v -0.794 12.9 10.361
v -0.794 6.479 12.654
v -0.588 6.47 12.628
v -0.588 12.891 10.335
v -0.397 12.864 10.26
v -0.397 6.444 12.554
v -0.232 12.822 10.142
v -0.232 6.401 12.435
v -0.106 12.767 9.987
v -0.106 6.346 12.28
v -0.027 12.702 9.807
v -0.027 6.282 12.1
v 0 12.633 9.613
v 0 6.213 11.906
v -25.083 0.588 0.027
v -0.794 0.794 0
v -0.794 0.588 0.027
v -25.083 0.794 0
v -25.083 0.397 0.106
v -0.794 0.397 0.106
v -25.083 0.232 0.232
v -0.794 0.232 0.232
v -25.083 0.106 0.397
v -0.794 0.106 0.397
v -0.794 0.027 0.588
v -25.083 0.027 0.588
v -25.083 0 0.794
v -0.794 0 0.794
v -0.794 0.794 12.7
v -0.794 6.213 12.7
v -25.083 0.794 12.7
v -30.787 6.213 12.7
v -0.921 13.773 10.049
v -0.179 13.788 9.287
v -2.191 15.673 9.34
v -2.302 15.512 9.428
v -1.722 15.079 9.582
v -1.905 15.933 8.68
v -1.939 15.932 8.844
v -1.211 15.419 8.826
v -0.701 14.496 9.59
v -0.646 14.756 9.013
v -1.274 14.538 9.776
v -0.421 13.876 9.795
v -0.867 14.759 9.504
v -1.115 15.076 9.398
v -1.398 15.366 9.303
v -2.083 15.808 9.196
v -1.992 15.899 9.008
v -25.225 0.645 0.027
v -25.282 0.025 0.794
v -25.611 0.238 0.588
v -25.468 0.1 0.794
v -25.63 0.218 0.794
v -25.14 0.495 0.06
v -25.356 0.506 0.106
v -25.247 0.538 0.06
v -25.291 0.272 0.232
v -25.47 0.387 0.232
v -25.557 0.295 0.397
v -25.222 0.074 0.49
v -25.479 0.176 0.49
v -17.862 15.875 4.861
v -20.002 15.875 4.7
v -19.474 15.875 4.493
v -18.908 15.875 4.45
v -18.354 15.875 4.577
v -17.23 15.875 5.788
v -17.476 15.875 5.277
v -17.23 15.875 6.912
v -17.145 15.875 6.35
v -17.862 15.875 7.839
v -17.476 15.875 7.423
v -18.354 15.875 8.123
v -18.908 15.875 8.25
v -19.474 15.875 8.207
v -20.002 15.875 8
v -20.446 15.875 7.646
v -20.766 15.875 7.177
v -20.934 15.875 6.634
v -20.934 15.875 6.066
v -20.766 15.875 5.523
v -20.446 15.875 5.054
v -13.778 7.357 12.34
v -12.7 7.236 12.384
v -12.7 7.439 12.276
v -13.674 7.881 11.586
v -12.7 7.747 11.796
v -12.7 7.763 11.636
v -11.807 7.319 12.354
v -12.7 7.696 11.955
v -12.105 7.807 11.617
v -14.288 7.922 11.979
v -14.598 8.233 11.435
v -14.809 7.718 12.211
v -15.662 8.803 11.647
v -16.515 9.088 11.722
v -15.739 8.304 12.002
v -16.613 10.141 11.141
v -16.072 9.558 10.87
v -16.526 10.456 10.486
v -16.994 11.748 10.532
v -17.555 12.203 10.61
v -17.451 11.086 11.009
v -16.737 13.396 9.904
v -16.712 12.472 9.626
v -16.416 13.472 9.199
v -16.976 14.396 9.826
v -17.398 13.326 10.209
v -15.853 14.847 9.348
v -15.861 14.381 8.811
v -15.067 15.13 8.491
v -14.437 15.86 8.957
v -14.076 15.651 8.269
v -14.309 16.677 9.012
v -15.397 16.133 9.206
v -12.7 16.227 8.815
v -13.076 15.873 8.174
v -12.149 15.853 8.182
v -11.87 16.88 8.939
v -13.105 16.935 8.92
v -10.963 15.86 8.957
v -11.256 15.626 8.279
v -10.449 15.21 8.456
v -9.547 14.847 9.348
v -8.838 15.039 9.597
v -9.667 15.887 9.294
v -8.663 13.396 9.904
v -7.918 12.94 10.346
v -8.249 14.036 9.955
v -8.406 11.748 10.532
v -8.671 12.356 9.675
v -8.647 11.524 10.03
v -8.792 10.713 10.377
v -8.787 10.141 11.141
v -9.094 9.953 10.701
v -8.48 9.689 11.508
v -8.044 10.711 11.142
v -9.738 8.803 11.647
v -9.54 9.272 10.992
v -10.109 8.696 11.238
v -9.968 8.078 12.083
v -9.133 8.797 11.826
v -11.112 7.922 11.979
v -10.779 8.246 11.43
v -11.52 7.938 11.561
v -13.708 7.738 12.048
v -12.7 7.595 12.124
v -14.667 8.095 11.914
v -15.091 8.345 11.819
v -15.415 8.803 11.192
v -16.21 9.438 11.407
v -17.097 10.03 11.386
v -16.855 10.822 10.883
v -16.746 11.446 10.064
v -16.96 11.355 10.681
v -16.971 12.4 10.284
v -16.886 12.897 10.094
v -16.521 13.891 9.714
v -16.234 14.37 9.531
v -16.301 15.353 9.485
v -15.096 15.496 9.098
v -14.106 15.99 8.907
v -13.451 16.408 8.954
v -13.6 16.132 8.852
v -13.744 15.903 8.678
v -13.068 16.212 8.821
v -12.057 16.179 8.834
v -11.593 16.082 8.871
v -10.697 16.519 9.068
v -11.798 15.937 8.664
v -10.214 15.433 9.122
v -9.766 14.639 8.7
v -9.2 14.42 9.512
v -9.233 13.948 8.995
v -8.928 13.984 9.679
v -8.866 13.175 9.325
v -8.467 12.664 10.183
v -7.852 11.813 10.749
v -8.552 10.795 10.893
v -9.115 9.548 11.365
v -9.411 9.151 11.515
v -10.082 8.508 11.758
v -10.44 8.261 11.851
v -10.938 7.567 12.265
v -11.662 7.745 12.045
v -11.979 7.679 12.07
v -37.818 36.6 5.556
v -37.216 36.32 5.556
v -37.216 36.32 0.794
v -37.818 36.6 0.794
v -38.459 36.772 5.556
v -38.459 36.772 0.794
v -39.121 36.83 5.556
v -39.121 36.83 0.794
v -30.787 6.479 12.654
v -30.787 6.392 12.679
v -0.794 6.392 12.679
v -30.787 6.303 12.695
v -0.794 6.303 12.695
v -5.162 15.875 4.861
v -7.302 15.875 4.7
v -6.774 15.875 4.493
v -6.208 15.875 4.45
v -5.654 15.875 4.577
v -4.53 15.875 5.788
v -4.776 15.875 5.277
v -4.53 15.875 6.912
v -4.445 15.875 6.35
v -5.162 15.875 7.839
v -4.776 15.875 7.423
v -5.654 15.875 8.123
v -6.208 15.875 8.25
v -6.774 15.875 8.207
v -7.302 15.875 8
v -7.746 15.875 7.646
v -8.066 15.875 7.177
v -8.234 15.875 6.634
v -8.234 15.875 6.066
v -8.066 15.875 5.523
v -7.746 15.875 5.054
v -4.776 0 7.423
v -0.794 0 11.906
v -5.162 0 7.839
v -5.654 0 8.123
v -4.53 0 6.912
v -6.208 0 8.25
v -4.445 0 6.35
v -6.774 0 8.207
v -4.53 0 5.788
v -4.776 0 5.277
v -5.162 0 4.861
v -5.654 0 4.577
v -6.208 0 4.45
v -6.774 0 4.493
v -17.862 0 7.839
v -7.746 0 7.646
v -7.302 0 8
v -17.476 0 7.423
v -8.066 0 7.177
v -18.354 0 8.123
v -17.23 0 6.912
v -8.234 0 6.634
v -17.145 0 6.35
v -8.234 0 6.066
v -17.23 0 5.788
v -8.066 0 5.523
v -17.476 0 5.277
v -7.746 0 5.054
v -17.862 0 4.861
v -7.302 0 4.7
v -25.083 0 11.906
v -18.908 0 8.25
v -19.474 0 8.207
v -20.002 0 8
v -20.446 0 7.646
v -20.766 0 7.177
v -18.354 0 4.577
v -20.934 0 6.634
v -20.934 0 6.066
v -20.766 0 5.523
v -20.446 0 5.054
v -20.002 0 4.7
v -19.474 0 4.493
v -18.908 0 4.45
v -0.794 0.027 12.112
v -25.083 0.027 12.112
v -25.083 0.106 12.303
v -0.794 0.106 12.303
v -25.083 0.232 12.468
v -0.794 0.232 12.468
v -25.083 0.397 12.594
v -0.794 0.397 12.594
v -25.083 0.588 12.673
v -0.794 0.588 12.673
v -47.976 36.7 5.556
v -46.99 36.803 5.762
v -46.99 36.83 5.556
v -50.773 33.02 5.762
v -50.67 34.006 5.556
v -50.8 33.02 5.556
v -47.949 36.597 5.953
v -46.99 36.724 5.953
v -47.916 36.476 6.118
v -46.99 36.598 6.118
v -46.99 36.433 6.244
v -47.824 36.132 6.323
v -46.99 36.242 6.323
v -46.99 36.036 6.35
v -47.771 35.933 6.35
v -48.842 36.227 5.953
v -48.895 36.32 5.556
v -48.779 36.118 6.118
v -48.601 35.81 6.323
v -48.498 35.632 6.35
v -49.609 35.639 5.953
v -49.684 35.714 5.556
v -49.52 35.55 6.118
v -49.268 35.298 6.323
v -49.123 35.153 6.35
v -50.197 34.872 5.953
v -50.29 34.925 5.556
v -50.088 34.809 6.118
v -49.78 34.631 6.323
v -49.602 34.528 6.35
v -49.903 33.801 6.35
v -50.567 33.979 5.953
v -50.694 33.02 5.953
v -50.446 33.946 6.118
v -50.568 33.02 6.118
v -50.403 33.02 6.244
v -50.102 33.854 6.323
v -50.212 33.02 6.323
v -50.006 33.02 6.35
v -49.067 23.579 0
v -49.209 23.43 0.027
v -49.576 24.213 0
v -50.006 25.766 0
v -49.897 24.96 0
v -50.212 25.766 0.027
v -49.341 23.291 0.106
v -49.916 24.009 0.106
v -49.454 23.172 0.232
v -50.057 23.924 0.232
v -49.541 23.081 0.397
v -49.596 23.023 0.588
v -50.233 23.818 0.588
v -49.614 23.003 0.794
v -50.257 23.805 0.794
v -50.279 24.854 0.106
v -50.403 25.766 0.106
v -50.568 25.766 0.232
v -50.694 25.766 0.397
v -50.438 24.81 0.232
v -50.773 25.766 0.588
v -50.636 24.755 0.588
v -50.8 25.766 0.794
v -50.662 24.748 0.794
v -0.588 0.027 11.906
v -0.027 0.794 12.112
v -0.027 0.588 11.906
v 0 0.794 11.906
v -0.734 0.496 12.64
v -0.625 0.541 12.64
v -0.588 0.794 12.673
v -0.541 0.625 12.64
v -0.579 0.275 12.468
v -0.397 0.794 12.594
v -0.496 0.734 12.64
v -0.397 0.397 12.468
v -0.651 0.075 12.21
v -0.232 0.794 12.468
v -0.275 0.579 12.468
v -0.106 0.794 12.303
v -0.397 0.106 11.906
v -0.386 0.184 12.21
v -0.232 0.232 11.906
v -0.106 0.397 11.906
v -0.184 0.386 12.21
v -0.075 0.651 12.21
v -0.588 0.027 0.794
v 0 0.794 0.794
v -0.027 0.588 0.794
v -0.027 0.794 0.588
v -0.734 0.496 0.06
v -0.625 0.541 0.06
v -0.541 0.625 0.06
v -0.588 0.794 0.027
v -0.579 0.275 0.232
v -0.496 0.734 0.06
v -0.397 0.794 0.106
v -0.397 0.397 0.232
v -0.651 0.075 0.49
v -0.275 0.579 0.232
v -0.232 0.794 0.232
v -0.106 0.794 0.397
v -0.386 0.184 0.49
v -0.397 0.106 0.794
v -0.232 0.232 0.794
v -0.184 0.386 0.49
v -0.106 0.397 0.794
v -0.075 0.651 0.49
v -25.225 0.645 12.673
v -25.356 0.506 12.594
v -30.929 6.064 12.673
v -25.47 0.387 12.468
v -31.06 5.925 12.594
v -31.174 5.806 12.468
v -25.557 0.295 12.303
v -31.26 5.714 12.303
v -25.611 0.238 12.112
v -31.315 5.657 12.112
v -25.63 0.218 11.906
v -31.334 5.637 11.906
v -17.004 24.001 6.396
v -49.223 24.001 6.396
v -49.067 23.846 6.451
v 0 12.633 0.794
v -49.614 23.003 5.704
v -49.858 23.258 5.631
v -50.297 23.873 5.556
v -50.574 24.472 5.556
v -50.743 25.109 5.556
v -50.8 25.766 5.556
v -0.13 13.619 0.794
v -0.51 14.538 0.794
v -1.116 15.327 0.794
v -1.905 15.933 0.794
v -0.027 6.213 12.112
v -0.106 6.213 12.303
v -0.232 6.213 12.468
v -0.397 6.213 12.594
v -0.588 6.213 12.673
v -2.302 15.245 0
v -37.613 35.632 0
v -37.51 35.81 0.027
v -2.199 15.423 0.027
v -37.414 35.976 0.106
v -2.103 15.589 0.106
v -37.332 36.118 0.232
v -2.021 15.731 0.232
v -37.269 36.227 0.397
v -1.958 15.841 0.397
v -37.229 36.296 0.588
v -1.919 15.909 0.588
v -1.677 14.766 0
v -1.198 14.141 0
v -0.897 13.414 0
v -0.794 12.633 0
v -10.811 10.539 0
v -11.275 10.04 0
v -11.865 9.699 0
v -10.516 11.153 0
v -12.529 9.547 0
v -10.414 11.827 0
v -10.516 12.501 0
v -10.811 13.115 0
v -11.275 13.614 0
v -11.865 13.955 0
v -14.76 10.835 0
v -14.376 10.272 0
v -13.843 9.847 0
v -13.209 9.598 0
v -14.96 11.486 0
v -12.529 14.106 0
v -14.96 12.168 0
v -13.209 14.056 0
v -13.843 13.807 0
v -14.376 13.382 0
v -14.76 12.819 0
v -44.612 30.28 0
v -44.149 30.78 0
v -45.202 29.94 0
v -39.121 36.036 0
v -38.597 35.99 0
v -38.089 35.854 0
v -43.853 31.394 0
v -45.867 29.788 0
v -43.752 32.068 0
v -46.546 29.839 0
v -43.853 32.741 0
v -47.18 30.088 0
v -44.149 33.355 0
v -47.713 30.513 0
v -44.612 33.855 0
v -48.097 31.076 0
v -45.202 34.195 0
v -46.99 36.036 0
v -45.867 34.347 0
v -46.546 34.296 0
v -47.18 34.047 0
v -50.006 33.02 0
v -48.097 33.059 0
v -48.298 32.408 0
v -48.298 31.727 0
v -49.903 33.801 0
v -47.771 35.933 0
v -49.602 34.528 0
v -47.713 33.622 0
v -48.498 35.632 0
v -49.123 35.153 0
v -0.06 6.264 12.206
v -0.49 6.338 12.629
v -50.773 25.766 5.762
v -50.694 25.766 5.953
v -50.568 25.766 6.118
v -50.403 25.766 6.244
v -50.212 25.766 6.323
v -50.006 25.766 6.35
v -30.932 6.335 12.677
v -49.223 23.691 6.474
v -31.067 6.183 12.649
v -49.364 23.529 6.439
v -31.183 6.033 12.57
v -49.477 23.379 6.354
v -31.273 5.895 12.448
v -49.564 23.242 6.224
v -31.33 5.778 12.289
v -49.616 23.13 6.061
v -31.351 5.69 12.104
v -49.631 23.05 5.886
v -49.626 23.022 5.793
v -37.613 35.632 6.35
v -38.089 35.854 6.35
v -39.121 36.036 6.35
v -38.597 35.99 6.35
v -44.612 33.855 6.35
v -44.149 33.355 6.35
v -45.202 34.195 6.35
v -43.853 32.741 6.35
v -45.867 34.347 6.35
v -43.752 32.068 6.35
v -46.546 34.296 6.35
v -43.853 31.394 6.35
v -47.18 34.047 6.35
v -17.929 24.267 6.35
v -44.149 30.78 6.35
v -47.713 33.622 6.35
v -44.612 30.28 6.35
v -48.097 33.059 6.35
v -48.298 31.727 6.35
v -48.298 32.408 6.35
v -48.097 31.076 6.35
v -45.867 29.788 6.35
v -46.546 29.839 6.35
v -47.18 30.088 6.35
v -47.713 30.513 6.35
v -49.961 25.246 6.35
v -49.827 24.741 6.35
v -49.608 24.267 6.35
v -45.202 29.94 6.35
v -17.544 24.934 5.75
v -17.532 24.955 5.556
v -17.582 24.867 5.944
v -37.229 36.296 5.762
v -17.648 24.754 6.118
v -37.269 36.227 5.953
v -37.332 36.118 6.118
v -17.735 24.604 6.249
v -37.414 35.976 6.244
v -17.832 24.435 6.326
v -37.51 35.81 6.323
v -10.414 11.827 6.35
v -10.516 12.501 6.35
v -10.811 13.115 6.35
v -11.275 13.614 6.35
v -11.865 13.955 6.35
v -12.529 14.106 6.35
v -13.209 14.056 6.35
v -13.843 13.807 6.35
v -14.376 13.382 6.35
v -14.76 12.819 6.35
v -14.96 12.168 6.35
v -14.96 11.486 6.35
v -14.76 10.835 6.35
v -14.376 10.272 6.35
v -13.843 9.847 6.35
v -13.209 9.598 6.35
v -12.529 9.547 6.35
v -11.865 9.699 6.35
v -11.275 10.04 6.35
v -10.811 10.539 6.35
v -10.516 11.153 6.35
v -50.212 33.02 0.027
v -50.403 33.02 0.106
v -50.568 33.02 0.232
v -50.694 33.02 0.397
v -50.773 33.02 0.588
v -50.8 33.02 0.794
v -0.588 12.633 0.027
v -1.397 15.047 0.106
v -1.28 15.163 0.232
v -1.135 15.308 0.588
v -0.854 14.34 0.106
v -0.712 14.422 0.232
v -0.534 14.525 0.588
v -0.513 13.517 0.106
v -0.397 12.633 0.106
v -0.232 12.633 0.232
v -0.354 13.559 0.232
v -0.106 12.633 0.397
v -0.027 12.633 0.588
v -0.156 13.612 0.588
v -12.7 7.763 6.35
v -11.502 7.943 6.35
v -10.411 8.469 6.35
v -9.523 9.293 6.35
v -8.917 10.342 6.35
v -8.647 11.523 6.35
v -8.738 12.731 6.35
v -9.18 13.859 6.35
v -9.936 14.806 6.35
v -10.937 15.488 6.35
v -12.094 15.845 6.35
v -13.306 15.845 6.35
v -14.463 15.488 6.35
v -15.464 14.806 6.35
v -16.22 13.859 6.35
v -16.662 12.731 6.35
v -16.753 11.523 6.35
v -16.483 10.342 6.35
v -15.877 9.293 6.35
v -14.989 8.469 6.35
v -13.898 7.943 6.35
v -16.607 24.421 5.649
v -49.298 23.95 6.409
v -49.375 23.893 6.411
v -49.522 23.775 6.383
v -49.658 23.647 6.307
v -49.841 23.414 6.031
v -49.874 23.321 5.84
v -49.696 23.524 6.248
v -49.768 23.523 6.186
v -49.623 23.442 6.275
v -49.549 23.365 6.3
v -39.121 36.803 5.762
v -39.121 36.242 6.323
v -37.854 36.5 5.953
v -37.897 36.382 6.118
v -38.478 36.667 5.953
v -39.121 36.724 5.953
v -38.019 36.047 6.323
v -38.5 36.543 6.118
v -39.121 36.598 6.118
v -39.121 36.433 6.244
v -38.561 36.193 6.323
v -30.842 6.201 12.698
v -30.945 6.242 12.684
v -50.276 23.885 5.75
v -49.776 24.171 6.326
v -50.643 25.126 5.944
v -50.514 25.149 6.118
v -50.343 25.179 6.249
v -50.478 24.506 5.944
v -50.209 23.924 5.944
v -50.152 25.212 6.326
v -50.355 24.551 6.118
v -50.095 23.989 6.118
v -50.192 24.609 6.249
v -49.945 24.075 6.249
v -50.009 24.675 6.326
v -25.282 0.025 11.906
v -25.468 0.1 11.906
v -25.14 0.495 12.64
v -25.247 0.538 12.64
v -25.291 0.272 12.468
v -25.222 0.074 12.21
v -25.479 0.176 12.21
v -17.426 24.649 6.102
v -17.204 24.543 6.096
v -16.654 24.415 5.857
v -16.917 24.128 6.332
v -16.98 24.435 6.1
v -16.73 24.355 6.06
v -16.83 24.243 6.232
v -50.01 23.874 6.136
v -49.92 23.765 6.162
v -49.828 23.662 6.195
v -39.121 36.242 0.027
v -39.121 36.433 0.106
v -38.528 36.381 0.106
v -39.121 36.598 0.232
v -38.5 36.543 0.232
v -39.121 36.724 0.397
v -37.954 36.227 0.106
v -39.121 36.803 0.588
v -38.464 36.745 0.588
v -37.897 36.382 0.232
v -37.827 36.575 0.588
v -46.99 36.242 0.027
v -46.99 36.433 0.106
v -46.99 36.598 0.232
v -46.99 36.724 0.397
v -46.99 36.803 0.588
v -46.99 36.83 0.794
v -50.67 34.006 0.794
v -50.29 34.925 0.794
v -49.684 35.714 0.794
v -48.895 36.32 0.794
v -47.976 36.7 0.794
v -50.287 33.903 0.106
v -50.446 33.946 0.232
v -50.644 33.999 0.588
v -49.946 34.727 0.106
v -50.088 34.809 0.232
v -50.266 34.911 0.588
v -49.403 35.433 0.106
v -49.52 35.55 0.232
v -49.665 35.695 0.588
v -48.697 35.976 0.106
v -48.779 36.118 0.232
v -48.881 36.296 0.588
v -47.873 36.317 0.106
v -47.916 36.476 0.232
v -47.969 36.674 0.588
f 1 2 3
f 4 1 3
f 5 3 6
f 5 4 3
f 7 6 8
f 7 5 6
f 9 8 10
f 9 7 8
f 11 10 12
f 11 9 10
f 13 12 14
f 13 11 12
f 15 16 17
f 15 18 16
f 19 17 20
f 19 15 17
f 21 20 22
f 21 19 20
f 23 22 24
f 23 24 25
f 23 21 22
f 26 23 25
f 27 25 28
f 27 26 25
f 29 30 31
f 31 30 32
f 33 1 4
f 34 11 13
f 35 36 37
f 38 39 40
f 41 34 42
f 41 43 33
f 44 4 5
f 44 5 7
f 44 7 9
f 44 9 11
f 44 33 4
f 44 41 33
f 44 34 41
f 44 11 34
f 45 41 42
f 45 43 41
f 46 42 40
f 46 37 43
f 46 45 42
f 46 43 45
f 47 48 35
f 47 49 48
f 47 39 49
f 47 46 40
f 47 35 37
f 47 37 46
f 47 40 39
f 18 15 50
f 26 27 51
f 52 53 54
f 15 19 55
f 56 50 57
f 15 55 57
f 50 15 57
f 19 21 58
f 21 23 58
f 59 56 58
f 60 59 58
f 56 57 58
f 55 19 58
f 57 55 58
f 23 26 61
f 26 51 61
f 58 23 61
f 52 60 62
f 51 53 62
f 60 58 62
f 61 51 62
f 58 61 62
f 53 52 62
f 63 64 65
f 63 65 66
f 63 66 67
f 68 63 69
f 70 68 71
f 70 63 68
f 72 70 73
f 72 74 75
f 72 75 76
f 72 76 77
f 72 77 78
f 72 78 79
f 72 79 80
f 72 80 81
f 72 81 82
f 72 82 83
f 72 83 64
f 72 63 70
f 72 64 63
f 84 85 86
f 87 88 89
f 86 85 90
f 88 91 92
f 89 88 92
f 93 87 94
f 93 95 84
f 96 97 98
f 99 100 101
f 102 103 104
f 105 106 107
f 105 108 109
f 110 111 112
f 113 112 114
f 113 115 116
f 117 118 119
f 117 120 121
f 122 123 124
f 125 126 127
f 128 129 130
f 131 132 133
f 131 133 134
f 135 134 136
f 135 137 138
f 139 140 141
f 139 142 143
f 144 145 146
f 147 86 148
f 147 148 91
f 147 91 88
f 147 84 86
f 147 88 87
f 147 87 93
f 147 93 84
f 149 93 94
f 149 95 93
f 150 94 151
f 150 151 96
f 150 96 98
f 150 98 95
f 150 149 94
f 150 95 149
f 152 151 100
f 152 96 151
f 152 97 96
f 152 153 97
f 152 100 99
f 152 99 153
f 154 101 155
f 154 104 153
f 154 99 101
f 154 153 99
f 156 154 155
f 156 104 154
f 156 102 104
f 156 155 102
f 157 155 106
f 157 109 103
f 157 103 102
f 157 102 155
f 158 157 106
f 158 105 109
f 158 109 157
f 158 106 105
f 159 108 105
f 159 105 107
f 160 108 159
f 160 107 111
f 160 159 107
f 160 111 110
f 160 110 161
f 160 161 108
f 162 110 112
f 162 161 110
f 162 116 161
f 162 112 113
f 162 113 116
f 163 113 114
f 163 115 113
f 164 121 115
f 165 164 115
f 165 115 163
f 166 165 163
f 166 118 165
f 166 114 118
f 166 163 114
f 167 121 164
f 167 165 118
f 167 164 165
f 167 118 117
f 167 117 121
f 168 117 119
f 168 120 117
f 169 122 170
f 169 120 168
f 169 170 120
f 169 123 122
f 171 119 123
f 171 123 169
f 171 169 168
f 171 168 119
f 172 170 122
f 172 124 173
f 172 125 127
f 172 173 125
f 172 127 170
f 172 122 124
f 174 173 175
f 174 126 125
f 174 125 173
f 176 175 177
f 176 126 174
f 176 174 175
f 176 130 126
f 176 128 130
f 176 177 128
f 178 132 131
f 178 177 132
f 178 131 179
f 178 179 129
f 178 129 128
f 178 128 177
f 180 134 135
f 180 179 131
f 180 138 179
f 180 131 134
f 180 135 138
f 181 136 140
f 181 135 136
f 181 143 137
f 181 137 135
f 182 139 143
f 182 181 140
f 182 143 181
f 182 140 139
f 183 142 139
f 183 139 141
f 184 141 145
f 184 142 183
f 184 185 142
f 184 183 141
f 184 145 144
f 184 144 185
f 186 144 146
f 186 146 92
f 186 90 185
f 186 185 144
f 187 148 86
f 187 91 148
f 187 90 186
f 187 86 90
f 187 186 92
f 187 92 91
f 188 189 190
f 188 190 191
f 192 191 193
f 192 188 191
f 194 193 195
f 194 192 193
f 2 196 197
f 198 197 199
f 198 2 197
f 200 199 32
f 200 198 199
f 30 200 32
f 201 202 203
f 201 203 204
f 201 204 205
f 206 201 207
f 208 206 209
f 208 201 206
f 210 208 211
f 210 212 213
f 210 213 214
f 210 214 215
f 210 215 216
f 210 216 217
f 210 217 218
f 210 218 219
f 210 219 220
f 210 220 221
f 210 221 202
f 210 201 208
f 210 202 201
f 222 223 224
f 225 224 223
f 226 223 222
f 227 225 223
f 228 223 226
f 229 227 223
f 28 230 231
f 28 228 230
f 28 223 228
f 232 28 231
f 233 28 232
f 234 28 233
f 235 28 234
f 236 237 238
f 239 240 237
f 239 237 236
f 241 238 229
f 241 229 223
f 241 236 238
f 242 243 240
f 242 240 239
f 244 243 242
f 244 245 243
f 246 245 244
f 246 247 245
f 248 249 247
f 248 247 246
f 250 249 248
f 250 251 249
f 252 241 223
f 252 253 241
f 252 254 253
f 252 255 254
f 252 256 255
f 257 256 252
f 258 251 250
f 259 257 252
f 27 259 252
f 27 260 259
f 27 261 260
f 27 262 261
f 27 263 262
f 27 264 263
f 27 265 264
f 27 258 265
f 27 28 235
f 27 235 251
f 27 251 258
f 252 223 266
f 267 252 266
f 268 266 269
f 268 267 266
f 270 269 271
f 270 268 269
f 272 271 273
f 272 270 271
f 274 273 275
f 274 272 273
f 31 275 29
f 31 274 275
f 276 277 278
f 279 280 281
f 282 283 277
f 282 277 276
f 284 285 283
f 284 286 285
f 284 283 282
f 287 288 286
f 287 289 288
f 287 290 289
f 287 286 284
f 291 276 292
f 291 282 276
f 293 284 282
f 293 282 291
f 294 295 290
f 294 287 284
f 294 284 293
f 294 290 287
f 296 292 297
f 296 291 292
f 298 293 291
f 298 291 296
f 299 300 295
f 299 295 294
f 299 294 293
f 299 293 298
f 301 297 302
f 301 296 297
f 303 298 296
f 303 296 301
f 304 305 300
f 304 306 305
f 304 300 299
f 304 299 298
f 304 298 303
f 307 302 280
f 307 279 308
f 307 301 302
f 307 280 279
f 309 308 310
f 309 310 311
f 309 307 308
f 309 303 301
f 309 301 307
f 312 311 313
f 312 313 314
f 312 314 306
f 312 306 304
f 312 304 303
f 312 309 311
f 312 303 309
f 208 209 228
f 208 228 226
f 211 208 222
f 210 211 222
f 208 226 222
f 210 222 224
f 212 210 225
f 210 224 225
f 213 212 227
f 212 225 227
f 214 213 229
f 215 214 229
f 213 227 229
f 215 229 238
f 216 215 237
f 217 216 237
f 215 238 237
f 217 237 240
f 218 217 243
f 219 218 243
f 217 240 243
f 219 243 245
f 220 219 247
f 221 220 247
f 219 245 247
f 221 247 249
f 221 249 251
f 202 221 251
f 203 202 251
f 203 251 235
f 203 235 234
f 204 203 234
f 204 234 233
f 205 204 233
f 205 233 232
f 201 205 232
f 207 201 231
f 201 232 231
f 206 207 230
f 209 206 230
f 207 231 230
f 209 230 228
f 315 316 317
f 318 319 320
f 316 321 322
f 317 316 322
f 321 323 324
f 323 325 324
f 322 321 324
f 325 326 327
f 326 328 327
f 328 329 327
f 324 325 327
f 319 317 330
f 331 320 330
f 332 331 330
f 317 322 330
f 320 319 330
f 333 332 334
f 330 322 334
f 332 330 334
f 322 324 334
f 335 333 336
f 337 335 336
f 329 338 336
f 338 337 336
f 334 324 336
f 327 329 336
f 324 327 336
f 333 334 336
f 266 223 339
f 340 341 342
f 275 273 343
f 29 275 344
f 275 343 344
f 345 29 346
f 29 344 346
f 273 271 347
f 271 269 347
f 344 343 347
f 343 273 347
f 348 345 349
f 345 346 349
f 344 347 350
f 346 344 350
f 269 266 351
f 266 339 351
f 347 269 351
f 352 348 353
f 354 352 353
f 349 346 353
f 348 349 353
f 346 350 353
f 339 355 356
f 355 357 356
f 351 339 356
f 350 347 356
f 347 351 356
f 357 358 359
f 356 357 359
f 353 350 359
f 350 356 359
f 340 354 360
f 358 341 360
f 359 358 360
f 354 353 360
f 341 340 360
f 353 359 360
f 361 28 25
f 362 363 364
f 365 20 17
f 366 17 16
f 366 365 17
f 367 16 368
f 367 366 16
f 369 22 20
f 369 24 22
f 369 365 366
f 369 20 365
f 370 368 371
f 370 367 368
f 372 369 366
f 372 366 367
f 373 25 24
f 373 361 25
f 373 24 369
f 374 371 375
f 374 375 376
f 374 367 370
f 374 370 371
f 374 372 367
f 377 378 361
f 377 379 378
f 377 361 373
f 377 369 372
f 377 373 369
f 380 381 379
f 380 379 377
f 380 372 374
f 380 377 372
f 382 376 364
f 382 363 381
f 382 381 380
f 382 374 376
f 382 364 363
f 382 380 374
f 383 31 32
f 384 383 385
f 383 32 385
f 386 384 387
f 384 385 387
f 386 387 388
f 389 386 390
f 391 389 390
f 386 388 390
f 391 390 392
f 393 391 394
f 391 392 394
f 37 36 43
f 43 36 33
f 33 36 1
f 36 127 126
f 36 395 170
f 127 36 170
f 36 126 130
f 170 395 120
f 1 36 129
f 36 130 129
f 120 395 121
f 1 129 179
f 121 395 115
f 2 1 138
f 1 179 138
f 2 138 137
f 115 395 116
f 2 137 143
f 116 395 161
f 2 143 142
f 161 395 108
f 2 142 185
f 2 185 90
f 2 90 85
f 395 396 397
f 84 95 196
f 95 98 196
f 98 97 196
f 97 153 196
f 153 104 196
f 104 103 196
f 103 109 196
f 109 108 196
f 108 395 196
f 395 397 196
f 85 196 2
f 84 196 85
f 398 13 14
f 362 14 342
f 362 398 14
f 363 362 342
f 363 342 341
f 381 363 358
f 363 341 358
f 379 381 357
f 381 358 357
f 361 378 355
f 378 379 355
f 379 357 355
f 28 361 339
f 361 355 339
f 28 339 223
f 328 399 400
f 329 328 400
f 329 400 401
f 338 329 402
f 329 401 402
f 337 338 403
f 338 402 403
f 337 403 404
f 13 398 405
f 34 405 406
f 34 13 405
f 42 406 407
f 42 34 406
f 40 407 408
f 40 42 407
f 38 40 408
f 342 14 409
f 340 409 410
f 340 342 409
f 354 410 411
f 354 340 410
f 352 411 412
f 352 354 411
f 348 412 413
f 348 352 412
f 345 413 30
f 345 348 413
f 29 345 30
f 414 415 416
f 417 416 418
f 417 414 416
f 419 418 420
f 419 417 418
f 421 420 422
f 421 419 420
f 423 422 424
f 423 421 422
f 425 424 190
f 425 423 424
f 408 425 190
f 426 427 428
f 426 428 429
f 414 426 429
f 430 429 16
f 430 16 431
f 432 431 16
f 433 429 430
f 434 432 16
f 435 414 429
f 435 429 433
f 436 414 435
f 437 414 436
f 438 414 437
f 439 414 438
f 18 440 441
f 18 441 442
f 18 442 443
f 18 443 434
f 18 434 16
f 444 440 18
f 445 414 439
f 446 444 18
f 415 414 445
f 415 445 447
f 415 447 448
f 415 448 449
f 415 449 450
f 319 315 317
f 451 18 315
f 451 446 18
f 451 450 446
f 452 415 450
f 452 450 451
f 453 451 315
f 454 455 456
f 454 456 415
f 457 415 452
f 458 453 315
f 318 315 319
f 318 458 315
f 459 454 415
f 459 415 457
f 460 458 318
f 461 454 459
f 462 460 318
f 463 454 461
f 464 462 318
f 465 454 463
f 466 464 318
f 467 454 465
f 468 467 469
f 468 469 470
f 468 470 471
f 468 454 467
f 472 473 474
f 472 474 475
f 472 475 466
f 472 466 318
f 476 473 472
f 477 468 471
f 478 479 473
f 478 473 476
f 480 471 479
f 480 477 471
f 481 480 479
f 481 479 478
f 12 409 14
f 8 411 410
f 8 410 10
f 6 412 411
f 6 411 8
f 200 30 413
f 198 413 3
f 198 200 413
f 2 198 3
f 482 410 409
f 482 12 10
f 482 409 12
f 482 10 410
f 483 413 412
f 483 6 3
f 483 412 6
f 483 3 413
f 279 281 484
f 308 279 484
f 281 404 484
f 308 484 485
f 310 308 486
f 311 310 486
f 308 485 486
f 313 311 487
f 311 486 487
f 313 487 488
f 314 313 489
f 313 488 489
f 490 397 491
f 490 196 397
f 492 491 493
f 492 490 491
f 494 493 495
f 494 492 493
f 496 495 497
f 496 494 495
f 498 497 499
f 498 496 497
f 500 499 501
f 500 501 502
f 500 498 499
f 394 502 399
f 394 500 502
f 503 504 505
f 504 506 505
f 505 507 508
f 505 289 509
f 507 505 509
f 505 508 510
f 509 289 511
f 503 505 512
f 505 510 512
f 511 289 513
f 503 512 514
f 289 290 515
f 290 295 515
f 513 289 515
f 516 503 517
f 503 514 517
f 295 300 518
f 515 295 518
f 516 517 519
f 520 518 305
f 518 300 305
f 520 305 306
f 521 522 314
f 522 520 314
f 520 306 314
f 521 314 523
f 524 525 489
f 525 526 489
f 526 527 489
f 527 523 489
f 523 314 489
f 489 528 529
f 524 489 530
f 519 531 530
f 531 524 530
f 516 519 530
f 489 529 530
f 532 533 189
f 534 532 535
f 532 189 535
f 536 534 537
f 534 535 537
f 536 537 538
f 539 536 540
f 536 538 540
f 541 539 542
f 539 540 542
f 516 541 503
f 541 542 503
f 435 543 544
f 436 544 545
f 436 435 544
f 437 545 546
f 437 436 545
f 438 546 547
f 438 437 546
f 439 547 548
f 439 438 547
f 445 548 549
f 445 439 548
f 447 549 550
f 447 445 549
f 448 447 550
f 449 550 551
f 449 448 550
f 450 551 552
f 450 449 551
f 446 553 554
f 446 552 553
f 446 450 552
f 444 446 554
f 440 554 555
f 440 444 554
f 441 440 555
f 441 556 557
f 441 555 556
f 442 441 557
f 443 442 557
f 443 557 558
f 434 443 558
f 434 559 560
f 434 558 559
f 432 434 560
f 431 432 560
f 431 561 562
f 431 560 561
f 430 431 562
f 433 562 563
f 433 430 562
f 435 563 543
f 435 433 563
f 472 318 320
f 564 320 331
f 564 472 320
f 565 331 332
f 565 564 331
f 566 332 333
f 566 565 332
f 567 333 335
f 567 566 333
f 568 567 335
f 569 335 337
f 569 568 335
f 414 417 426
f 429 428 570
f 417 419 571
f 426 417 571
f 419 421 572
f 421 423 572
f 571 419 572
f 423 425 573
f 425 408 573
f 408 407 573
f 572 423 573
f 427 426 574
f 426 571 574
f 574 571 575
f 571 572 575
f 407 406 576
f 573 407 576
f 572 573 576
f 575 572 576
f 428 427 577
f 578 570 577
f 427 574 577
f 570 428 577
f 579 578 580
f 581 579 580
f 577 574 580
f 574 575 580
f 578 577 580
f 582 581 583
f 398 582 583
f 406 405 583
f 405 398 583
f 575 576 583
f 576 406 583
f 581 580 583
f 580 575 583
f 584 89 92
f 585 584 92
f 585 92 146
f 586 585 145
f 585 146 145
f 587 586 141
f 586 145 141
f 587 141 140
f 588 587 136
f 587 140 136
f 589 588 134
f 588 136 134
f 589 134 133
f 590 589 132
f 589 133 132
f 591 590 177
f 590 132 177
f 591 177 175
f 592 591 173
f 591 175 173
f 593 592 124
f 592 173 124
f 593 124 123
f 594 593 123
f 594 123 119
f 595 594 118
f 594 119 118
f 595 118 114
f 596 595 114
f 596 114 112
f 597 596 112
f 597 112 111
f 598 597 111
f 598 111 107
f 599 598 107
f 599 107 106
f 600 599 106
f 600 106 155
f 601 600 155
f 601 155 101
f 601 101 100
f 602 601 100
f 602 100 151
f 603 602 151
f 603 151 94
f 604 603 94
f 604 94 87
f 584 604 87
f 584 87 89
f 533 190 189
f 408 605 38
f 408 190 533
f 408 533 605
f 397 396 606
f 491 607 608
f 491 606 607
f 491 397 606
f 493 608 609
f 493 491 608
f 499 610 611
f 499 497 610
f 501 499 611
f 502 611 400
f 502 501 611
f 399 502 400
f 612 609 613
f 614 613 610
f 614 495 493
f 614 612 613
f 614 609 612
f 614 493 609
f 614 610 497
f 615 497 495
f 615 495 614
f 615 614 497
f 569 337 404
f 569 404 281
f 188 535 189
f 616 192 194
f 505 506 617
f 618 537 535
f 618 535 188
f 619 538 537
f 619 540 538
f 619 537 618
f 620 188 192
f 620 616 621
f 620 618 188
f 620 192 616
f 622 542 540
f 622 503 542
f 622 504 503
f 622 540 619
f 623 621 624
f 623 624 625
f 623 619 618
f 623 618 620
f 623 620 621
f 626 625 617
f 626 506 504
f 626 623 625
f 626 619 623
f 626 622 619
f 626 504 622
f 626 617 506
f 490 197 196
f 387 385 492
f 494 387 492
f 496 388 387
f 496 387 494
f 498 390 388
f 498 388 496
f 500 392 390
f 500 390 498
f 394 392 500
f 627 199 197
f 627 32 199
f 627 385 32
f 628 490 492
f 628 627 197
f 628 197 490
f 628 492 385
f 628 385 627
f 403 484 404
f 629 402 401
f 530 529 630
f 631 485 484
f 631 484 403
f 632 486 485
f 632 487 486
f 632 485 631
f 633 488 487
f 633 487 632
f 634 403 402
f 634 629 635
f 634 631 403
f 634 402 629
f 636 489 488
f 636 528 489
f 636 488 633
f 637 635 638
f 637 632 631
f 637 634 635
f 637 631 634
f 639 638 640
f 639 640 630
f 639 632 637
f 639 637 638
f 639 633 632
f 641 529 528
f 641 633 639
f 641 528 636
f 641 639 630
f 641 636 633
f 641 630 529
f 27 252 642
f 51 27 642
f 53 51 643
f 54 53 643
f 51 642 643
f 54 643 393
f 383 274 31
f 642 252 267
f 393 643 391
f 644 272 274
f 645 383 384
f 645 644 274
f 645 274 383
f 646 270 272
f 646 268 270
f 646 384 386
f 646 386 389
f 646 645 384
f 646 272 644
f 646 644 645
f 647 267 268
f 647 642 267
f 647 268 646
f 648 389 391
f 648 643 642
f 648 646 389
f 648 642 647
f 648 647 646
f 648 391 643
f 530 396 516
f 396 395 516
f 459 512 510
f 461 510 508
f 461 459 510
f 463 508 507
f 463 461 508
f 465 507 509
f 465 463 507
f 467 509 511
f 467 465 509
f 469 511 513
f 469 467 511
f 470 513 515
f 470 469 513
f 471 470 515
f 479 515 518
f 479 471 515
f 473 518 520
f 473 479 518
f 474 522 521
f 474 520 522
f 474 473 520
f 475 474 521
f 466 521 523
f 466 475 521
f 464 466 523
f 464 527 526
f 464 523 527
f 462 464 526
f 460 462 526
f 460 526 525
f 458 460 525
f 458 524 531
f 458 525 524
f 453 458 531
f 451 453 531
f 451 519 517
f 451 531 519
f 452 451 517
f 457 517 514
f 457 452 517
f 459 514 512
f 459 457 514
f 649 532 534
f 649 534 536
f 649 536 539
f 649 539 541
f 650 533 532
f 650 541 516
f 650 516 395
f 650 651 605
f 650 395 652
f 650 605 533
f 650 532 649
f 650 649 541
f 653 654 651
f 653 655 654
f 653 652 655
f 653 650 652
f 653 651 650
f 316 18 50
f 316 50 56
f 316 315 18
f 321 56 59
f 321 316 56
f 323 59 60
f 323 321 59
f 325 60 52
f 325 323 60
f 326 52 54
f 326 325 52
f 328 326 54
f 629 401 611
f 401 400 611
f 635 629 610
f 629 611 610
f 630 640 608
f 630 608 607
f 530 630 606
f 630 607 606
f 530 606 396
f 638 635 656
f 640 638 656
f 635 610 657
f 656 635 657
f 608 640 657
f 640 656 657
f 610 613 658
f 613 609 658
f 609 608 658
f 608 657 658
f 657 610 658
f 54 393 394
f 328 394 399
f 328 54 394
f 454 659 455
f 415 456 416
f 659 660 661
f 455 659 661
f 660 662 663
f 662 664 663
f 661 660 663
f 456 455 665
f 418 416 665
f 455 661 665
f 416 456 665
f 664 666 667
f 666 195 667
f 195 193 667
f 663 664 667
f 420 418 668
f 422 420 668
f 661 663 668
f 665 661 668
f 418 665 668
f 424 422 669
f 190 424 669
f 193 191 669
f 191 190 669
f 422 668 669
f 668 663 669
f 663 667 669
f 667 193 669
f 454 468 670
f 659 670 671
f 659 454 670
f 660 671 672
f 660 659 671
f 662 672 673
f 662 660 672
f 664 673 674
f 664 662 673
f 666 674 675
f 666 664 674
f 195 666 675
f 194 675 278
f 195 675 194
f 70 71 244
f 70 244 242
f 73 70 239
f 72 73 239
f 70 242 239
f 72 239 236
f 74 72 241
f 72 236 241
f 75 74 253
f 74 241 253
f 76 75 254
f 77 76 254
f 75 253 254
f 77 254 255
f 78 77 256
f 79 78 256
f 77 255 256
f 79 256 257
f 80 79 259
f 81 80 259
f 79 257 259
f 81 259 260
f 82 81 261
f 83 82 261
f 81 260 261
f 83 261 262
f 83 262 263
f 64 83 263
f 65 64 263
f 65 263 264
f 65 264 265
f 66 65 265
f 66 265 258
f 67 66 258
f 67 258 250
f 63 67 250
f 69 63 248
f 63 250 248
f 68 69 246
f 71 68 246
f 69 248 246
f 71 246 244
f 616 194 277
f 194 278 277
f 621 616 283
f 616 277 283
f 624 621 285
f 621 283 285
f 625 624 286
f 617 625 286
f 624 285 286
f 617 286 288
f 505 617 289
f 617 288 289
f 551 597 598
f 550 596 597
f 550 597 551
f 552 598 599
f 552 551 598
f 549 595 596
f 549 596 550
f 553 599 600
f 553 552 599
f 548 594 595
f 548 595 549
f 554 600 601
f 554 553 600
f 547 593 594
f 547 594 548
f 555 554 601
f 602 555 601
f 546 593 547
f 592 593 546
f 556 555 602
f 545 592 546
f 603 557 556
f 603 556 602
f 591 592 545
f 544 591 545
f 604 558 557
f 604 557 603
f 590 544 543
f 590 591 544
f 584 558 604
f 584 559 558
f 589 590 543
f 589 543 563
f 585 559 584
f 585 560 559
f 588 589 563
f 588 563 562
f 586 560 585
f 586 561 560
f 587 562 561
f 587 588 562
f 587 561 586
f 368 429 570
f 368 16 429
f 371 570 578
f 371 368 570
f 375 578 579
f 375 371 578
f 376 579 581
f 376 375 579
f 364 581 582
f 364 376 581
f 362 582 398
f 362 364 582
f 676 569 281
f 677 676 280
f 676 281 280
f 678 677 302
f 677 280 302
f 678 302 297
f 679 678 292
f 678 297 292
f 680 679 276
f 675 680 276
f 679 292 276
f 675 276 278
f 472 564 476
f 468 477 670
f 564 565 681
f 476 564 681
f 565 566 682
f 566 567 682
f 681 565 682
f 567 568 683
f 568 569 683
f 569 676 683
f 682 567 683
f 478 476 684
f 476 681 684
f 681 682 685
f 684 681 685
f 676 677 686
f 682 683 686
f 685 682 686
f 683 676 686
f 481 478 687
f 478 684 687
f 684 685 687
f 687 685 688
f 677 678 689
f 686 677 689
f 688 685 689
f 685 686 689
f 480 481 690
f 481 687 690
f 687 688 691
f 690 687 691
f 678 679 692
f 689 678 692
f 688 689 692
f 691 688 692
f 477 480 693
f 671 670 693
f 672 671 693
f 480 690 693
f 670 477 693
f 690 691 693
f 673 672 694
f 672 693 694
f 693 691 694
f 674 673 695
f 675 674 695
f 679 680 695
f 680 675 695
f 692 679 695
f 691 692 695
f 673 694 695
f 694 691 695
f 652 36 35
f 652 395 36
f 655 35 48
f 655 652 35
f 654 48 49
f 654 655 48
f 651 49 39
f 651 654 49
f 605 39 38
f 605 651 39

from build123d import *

# Parameters (mm, degrees)
SKETCH8_R           = 2.286
BOSS_EXTRUDE1_DEPTH = 12.7
SKETCH9_R           = 1.905
CUT_EXTRUDE4_DEPTH  = 15.875
CUT_EXTRUDE5_DEPTH  = 65.018582459
SKETCH11_R          = 4.064
CUT_EXTRUDE6_DEPTH  = 6.35
FILLET1_R           = 3.81
FILLET2_R           = 0.79375


with BuildPart() as part:
    # Sketch8 → Boss-Extrude1 (new body)
    with BuildSketch(Plane.XY):
        Polygon((0, 0), (-25.4, 0), (-50.8, 24.13), (-50.8, 36.83), (-38.1, 36.83), (0, 14.832954744), align=None)
        with Locations((-12.7, 11.826875)):
            Circle(SKETCH8_R, mode=Mode.SUBTRACT)
        with Locations((-46.0375, 32.0675)):
            Circle(SKETCH8_R, mode=Mode.SUBTRACT)
    extrude(amount=BOSS_EXTRUDE1_DEPTH)

    # Sketch9 → Cut-Extrude4 (cut)
    with BuildSketch(Plane.XZ):
        with Locations((-6.35, 6.35)):
            Circle(SKETCH9_R)
        with Locations((-19.05, 6.35)):
            Circle(SKETCH9_R)
    extrude(amount=-CUT_EXTRUDE4_DEPTH, mode=Mode.SUBTRACT)

    # Sketch10 → Cut-Extrude5 (cut, through all)
    with BuildSketch(Plane.ZY.offset(50.8)):
        Polygon((6.35, 36.83), (6.35, 24.13), (12.7, 6.35), (12.7, 36.83), align=None)
    extrude(amount=-CUT_EXTRUDE5_DEPTH, mode=Mode.SUBTRACT)

    # Sketch11 → Cut-Extrude6 (cut)
    with BuildSketch(Plane.XY.offset(12.7)):
        with Locations(Location((-12.7, 11.826875, 0), (0, 0, 270))):
            Circle(SKETCH11_R)
    extrude(amount=-CUT_EXTRUDE6_DEPTH, mode=Mode.SUBTRACT)

    # Fillet1
    fillet1_edges = [part.edges().sort_by_distance(p)[0] for p in [
        (-50.8, 24.13, 3.175),
        (-50.8, 36.83, 3.175),
        (-38.1, 36.83, 3.175),
        (0, 14.832954744, 4.835186653),
    ]]
    fillet(fillet1_edges, radius=FILLET1_R)

    # Fillet2
    fillet2_edges = [part.edges().sort_by_distance(p)[0] for p in [
        (0, 0, 6.35),
        (-25.4, 0, 6.35),
        (-12.7, 0, 12.7),
        (-28.742105263, 3.175, 12.7),
        (-9.003977372, 20.031403503, 7.813784463),
        (-16.042105263, 6.35, 12.7),
        (-40.849172988, 14.676714339, 9.72617345),
        (-33.266990546, 24.13, 6.35),
        (0, 3.175, 12.7),
        (-12.7, 0, 0),
        (-12.699987477, 15.890875, 9.292544643),
        (-37.507067725, 11.501714339, 0),
        (-50.8, 29.39283826, 0),
        (-43.055443212, 36.83, 0),
        (-19.560443212, 26.126181898, 0),
        (-0.510443212, 14.538250218, 0),
        (-38.134785861, 36.700177398, 0),
        (-49.684076836, 35.714076836, 0),
        (-50.491003861, 24.262655572, 0),
        (-50.8, 29.39283826, 6.35),
        (-43.055443212, 36.83, 6.35),
        (-26.659420584, 30.224778394, 6.35),
        (-38.134785861, 36.700177398, 6.35),
        (-49.684076836, 35.714076836, 6.35),
        (-50.706612058, 24.927288299, 6.35),
        (0, 9.491625109, 11.577991032),
        (0, 6.316625109, 0),
        (-0.498461944, 14.517345679, 9.783090829),
        (-50.076536566, 23.531981816, 6.563577923),
    ]]
    fillet(fillet2_edges, radius=FILLET2_R)


solid = part.part
